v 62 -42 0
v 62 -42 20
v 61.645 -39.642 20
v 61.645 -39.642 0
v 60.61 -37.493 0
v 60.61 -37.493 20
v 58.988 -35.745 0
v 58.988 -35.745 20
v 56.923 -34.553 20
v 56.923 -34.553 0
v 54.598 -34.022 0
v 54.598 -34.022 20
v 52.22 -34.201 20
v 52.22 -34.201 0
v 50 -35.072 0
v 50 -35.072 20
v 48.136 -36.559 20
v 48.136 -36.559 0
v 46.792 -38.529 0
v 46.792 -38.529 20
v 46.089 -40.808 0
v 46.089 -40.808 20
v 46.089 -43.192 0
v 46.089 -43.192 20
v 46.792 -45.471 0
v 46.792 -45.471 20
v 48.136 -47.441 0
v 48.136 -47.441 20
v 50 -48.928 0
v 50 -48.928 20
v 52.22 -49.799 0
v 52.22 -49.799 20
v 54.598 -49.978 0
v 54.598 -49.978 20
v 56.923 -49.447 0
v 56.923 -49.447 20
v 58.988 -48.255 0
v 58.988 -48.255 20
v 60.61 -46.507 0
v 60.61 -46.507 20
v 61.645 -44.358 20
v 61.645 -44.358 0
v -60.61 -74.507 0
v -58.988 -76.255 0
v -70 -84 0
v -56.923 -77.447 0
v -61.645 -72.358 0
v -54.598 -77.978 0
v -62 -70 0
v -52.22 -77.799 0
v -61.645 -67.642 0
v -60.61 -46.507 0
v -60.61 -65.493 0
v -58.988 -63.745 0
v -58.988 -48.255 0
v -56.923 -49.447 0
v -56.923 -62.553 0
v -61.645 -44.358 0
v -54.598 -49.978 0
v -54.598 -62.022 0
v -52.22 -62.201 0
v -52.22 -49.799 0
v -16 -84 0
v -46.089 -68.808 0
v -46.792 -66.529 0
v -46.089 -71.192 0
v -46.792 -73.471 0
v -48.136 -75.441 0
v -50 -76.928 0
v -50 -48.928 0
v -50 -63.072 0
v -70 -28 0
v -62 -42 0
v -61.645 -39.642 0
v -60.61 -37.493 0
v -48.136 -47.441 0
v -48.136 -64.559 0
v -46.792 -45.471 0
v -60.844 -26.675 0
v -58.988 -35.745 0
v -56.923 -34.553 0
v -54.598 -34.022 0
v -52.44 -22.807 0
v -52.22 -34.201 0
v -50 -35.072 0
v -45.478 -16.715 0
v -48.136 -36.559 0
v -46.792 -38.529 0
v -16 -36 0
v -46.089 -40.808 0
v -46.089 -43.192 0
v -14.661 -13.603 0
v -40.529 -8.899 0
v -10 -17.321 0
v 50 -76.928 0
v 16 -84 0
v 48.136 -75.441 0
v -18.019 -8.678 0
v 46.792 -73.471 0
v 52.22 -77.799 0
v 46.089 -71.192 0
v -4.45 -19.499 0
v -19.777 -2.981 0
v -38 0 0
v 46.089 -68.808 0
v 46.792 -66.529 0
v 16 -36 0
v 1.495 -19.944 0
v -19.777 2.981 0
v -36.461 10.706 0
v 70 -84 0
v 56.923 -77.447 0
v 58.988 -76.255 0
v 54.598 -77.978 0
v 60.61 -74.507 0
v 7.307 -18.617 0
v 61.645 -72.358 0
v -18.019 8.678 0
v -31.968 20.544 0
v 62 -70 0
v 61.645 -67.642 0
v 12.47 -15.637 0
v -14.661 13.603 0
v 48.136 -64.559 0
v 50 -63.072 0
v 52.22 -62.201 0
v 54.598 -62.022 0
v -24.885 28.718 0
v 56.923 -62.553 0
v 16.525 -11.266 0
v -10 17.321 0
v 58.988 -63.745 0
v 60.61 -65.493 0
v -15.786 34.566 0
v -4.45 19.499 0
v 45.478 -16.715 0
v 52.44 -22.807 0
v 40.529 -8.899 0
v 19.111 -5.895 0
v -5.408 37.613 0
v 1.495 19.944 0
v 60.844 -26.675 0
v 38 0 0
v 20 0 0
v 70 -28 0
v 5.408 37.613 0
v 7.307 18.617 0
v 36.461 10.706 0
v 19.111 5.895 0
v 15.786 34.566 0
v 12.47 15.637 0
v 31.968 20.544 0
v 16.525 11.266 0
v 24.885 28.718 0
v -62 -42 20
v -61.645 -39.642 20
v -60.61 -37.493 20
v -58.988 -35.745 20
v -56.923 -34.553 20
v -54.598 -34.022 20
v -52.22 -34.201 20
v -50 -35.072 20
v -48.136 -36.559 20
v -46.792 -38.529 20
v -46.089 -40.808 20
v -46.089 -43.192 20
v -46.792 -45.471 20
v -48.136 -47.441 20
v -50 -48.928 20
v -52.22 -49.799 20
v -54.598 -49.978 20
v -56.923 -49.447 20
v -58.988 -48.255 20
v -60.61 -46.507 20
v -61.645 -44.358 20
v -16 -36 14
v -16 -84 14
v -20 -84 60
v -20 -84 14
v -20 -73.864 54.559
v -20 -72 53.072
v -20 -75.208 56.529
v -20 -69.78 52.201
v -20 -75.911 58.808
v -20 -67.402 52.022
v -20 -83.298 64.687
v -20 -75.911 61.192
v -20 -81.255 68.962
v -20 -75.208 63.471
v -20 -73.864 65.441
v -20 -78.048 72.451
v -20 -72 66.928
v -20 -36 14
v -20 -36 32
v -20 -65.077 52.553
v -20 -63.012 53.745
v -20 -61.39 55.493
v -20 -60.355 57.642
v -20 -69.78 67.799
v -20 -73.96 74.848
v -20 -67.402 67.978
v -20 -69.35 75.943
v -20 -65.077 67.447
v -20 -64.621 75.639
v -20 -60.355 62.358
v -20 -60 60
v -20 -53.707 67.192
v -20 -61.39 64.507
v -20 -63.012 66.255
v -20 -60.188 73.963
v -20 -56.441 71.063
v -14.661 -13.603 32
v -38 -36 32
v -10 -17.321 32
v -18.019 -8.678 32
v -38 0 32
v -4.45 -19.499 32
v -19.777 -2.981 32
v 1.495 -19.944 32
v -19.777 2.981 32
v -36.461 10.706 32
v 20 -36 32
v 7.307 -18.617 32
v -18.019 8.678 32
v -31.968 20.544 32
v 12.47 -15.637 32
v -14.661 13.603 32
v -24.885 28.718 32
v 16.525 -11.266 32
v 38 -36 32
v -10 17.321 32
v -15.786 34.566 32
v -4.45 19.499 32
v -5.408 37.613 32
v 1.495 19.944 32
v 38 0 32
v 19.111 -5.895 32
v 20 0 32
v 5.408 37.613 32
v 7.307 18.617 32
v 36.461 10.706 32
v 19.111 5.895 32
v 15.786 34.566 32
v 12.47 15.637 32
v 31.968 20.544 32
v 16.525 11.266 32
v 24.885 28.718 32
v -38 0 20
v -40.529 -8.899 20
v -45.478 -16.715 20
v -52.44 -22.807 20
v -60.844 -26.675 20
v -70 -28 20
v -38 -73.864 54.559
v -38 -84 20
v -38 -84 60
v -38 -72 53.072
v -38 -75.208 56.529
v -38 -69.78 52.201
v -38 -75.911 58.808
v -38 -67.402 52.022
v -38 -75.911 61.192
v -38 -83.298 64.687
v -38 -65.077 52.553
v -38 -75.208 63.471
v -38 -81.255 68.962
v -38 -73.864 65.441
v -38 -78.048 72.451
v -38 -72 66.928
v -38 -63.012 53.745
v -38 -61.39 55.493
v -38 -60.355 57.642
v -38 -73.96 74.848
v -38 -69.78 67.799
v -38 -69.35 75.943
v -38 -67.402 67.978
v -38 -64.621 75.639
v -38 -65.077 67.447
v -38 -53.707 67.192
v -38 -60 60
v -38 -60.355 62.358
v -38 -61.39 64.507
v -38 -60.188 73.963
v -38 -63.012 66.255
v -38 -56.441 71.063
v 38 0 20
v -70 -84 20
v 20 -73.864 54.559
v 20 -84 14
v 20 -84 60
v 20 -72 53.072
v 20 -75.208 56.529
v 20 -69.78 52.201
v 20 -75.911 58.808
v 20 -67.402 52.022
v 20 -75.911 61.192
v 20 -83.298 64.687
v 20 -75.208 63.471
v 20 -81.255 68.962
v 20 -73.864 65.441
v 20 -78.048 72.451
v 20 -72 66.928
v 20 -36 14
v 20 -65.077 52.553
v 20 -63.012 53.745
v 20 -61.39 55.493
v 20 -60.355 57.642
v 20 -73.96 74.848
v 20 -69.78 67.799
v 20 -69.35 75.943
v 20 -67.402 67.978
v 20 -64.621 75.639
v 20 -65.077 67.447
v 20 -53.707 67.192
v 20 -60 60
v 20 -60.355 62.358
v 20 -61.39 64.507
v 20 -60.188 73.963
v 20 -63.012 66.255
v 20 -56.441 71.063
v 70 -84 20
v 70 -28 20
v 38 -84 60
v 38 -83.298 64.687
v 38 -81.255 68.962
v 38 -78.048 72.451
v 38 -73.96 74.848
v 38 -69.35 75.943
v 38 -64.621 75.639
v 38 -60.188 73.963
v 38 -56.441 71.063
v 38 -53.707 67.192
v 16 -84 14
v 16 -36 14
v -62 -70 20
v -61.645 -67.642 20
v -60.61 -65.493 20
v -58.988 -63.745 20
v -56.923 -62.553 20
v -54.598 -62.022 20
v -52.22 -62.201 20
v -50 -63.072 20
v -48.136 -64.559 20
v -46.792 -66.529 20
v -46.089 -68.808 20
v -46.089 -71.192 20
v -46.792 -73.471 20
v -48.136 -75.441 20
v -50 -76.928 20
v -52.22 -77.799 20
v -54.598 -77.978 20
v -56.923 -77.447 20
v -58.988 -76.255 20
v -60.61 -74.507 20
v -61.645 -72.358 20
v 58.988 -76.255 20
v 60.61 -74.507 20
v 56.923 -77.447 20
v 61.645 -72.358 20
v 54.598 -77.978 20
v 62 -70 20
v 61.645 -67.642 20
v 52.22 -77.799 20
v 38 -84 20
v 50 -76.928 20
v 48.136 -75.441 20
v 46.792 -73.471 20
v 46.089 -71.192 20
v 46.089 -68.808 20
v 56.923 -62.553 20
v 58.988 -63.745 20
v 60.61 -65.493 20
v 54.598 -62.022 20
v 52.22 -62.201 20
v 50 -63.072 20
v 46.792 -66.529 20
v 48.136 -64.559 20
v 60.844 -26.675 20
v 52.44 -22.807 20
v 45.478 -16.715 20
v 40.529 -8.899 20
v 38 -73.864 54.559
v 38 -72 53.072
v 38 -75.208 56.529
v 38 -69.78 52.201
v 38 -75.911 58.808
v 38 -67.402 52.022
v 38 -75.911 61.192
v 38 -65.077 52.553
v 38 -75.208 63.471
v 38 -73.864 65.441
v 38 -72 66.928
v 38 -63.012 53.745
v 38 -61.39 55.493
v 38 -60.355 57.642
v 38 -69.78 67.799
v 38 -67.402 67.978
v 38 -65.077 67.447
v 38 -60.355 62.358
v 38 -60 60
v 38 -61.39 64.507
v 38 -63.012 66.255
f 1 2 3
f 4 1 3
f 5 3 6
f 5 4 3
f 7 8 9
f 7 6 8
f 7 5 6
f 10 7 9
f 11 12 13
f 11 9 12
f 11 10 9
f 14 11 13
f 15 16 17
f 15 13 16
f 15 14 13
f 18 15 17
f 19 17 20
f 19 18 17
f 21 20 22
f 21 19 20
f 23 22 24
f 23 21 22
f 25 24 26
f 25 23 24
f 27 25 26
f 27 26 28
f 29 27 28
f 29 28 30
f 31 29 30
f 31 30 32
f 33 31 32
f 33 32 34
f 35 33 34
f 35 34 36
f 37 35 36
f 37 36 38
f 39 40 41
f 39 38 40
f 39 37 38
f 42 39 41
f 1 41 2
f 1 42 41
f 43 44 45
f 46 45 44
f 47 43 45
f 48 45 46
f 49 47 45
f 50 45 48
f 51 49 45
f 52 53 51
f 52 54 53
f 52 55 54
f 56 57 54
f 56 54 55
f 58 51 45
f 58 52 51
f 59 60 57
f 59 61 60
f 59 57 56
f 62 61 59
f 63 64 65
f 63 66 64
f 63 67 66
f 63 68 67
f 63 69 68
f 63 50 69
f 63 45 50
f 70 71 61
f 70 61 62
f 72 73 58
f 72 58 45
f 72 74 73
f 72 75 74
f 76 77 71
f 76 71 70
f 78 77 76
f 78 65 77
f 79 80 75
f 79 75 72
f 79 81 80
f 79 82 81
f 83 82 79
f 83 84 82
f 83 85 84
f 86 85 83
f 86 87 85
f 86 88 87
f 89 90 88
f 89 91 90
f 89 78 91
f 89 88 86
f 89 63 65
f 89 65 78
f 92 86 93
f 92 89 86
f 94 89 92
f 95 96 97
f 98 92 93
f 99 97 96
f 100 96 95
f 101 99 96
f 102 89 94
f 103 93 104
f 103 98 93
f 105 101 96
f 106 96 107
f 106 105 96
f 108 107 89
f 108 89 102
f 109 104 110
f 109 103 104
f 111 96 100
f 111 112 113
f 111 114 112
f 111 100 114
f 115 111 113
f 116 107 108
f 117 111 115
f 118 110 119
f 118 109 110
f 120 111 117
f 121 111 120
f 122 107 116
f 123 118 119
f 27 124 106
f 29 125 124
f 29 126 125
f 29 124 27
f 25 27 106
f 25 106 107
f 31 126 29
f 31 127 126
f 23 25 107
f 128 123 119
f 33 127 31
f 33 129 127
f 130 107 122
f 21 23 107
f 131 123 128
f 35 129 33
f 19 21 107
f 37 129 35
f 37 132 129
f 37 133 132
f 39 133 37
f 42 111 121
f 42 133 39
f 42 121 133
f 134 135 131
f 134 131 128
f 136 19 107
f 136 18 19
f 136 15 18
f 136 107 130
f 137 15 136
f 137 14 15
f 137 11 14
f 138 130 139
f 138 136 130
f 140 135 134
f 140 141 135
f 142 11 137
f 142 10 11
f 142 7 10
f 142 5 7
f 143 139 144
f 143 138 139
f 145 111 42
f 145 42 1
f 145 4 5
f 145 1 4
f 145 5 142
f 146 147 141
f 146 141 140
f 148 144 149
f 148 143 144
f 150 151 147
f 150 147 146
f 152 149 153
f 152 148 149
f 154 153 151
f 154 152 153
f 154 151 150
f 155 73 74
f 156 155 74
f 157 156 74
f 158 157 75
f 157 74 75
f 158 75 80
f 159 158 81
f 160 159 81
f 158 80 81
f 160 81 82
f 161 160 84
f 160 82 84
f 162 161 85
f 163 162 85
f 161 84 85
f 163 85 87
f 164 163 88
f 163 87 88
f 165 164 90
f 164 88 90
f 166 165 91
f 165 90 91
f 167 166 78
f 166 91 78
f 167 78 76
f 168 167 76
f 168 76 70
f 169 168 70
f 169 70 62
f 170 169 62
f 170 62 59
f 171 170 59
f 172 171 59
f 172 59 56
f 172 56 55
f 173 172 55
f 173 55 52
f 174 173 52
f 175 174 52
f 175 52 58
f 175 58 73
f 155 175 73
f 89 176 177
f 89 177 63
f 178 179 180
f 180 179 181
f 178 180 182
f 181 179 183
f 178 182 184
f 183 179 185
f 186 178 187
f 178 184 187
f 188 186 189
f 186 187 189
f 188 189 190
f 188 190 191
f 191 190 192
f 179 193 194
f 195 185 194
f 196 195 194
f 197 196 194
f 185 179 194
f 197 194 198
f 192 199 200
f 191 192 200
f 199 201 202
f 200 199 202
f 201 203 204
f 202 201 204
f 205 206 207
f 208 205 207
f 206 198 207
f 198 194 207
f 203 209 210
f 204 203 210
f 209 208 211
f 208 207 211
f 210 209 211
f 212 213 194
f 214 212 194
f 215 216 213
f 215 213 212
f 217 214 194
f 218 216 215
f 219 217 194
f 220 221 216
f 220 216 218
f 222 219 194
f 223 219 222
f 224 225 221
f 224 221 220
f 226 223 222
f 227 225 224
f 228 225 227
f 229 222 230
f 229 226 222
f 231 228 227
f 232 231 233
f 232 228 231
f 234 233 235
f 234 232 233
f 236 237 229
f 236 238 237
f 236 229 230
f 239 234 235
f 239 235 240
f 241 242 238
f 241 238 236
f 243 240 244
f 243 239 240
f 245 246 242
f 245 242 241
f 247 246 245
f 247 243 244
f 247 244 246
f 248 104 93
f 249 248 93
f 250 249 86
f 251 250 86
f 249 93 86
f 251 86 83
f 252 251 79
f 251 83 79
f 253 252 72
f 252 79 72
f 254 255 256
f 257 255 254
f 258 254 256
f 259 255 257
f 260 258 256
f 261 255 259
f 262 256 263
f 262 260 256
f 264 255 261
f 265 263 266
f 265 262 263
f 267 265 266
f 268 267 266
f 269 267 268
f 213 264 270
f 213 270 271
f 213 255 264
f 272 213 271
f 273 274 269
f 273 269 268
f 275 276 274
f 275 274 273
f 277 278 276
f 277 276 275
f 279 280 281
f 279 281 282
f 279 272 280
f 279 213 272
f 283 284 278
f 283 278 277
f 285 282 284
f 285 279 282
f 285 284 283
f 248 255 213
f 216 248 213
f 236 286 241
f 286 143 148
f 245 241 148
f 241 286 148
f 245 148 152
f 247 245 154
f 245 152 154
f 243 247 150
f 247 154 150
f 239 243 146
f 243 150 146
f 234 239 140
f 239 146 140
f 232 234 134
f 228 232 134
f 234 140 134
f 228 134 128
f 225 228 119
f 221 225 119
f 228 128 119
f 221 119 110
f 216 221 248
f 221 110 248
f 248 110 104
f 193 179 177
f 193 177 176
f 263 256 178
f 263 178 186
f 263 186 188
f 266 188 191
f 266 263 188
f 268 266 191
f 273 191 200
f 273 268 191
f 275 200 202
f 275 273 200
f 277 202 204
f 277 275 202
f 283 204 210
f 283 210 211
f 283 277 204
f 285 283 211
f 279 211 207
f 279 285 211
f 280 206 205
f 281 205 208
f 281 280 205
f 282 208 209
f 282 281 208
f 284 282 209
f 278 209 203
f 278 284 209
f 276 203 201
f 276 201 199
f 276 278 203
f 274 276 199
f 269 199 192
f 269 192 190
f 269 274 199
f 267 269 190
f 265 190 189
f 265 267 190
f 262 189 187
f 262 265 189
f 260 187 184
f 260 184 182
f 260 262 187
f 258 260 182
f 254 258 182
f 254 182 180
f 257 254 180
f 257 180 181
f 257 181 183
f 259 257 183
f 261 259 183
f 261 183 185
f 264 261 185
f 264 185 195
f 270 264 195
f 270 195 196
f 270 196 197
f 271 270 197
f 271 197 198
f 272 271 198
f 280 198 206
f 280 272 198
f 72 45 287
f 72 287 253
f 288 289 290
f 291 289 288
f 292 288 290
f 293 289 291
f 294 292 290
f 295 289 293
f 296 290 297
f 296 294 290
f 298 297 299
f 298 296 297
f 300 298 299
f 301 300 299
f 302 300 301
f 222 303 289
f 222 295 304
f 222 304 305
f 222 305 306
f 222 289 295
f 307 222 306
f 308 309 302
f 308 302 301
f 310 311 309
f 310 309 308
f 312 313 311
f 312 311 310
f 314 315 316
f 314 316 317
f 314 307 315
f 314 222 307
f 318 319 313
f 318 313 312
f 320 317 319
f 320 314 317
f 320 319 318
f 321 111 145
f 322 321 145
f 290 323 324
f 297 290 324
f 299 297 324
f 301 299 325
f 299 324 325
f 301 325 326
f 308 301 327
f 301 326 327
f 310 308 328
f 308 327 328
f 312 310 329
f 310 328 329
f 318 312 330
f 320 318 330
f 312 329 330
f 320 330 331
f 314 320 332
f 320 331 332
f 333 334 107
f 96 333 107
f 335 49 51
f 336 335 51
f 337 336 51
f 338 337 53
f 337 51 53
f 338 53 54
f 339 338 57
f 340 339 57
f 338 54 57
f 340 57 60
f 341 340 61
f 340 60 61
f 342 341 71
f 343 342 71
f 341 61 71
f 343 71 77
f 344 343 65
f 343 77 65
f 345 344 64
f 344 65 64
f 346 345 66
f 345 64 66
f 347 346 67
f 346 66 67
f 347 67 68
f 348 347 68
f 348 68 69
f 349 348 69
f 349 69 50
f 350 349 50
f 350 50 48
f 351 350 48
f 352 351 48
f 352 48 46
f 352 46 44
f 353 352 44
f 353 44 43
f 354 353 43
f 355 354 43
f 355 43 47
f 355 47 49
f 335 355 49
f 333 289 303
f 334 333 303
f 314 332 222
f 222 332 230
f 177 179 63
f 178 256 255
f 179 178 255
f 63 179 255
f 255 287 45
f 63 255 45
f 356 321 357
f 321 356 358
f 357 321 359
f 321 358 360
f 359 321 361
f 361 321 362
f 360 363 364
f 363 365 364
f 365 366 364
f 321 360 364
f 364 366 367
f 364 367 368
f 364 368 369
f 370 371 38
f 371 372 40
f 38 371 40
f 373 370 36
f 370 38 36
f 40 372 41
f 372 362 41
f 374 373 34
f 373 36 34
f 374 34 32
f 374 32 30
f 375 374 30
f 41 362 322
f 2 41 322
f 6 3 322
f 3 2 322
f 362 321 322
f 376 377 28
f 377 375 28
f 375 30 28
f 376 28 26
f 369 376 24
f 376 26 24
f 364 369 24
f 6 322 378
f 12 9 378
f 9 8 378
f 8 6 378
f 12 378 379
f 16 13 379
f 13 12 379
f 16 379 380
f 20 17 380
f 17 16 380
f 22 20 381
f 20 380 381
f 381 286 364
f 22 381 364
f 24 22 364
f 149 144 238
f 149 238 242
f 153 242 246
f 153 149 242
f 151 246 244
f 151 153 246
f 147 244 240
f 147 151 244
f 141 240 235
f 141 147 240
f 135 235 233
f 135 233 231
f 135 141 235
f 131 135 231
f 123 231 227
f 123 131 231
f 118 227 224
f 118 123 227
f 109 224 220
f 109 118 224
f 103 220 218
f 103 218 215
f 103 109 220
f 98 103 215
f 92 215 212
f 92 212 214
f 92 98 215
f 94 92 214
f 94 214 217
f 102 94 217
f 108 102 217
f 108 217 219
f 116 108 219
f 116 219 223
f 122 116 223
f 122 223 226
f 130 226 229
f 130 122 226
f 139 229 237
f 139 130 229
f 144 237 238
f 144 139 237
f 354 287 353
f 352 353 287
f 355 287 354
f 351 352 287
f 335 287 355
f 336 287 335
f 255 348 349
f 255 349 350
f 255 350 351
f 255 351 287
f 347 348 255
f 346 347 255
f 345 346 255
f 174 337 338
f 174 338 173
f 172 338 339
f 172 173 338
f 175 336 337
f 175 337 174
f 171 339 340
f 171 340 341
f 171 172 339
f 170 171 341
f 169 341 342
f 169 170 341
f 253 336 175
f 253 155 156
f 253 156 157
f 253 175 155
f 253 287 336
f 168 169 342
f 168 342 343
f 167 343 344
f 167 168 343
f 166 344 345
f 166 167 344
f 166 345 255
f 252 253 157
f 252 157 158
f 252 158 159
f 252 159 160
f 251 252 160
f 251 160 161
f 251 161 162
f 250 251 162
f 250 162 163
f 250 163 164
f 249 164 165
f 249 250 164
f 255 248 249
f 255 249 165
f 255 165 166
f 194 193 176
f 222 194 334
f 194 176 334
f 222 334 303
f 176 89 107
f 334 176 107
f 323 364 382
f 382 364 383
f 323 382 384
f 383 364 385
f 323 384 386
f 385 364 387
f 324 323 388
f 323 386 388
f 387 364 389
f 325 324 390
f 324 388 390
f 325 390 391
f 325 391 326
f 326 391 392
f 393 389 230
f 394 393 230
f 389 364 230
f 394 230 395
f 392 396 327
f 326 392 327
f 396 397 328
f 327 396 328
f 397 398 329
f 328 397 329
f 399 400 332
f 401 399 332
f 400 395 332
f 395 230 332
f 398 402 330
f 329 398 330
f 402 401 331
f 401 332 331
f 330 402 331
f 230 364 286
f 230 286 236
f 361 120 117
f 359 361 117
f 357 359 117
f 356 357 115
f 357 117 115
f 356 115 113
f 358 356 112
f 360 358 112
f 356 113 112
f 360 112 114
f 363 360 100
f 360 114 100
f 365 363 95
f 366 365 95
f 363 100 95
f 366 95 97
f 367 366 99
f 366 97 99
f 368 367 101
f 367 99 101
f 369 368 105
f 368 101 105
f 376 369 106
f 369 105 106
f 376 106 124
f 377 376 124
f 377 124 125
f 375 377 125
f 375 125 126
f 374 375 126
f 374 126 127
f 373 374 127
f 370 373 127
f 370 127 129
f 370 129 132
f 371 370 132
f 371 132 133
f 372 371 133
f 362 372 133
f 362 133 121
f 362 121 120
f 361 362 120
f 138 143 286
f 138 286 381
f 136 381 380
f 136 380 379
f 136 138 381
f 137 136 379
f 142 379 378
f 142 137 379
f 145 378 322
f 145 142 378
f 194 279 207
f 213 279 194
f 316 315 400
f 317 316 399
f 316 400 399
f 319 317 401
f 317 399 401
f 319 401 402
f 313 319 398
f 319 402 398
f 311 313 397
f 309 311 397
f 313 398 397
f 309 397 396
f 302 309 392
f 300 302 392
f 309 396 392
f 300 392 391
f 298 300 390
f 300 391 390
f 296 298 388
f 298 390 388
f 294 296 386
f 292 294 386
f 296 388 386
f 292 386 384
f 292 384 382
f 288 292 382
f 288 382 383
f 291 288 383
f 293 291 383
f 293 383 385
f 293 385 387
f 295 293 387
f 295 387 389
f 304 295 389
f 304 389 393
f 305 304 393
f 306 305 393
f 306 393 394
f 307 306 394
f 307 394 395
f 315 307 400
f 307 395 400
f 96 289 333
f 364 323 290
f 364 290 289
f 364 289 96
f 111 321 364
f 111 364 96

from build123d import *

# Parameters (mm, degrees)
SKETCH1_R              = 20
BOSS_EXTRUDE1_DEPTH    = 32
BOSS_EXTRUDE3_DEPTH    = 20
SKETCH16_W             = 32
SKETCH16_H             = 56
BOSS_EXTRUDE4_DEPTH    = 20
F_16_0MM_DOWEL_HOLE3_D = 16
LPATTERN5_COUNT        = 2
LPATTERN5_PITCH        = 28
MIRROR5_COPY_1_D       = 16
SKETCH25_R             = 8
BOSS_EXTRUDE6_DEPTH    = 18
SKETCH26_W             = 14
SKETCH26_H             = 48
BOSS_EXTRUDE7_DEPTH    = 4


with BuildPart() as part:
    # Sketch1 → Boss-Extrude1 (new body)
    with BuildSketch(Plane.XY):
        with BuildLine():
            Line((-38, 0), (-38, -36))
            Line((-38, -36), (38, -36))
            Line((38, -36), (38, 0))
            ThreePointArc((38, 0), (0, 38), (-38, 0))
        make_face()
        Circle(SKETCH1_R, mode=Mode.SUBTRACT)
    extrude(amount=BOSS_EXTRUDE1_DEPTH)

    # Sketch15 → Boss-Extrude3 (add)
    with BuildSketch(Plane.XY):
        with BuildLine():
            Line((-70, -28), (-38, -28))
            Line((-38, -28), (-38, 0))
            ThreePointArc((-38, 0), (-48.739708375, -20.011761858), (-70, -28))
        make_face()
    boss_extrude3 = extrude(amount=BOSS_EXTRUDE3_DEPTH)

    # Sketch16 → Boss-Extrude4 (add)
    with BuildSketch(Plane.XY):
        with Locations((-54, -56)):
            Rectangle(SKETCH16_W, SKETCH16_H)
    boss_extrude4 = extrude(amount=BOSS_EXTRUDE4_DEPTH)

    # Ø16.0mm Dowel Hole3 (through all)
    with Locations(Plane.XY.offset(20)):
        with Locations((-54, -42)):
            f_16_0mm_dowel_hole3 = Hole(F_16_0MM_DOWEL_HOLE3_D / 2)

    # LPattern5: Ø16.0mm Dowel Hole3 ×2
    with Locations(*[(0, -i * LPATTERN5_PITCH, 0) for i in range(1, LPATTERN5_COUNT)]):
        add(f_16_0mm_dowel_hole3, mode=Mode.SUBTRACT)

    # Mirror5: Boss-Extrude4, Boss-Extrude3, Ø16.0mm Dowel Hole3 across plane
    add(boss_extrude4.mirror(Plane(origin=(0, 0, 0), x_dir=(0, 0, 1), z_dir=(1, 0, 0))))
    add(boss_extrude3.mirror(Plane(origin=(0, 0, 0), x_dir=(0, 0, 1), z_dir=(1, 0, 0))))
    add(f_16_0mm_dowel_hole3.mirror(Plane(origin=(0, 0, 0), x_dir=(0, 0, 1), z_dir=(1, 0, 0))), mode=Mode.SUBTRACT)

    # Mirror5 copy 1 (through all)
    with Locations(Plane(origin=(0, -28, 20), x_dir=(-1, 0, 0), z_dir=(0, 0, 1))):
        with Locations((-54, 42)):
            Hole(MIRROR5_COPY_1_D / 2)

    # Sketch25 → Boss-Extrude6 (add)
    with BuildSketch(Plane(origin=(-38, 0, 0), x_dir=(0, 0, -1), z_dir=(1, 0, 0))):
        with BuildLine():
            Line((0, -84), (-60, -84))
            ThreePointArc((-60, -84), (-75.567317873, -71.695756248), (-67.191626537, -53.707326781))
            Line((-67.191626537, -53.707326781), (-32, -36))
            Line((-32, -36), (0, -36))
            Line((0, -36), (0, -84))
        make_face()
        with Locations(Location((-60, -68, 0), (0, 0, 90))):  # turned: the seam where the file's is
            Circle(SKETCH25_R, mode=Mode.SUBTRACT)
    boss_extrude6 = extrude(amount=BOSS_EXTRUDE6_DEPTH)

    # Sketch26 → Boss-Extrude7 (add)
    with BuildSketch(Plane(origin=(-20, 0, 0), x_dir=(0, 0, -1), z_dir=(1, 0, 0))):
        with Locations((-7, -60)):
            Rectangle(SKETCH26_W, SKETCH26_H)
    boss_extrude7 = extrude(amount=BOSS_EXTRUDE7_DEPTH)

    # Mirror6: Boss-Extrude6, Boss-Extrude7 across plane
    add(boss_extrude6.mirror(Plane(origin=(0, 0, 0), x_dir=(0, 0, 1), z_dir=(1, 0, 0))))
    add(boss_extrude7.mirror(Plane(origin=(0, 0, 0), x_dir=(0, 0, 1), z_dir=(1, 0, 0))))


solid = part.part
